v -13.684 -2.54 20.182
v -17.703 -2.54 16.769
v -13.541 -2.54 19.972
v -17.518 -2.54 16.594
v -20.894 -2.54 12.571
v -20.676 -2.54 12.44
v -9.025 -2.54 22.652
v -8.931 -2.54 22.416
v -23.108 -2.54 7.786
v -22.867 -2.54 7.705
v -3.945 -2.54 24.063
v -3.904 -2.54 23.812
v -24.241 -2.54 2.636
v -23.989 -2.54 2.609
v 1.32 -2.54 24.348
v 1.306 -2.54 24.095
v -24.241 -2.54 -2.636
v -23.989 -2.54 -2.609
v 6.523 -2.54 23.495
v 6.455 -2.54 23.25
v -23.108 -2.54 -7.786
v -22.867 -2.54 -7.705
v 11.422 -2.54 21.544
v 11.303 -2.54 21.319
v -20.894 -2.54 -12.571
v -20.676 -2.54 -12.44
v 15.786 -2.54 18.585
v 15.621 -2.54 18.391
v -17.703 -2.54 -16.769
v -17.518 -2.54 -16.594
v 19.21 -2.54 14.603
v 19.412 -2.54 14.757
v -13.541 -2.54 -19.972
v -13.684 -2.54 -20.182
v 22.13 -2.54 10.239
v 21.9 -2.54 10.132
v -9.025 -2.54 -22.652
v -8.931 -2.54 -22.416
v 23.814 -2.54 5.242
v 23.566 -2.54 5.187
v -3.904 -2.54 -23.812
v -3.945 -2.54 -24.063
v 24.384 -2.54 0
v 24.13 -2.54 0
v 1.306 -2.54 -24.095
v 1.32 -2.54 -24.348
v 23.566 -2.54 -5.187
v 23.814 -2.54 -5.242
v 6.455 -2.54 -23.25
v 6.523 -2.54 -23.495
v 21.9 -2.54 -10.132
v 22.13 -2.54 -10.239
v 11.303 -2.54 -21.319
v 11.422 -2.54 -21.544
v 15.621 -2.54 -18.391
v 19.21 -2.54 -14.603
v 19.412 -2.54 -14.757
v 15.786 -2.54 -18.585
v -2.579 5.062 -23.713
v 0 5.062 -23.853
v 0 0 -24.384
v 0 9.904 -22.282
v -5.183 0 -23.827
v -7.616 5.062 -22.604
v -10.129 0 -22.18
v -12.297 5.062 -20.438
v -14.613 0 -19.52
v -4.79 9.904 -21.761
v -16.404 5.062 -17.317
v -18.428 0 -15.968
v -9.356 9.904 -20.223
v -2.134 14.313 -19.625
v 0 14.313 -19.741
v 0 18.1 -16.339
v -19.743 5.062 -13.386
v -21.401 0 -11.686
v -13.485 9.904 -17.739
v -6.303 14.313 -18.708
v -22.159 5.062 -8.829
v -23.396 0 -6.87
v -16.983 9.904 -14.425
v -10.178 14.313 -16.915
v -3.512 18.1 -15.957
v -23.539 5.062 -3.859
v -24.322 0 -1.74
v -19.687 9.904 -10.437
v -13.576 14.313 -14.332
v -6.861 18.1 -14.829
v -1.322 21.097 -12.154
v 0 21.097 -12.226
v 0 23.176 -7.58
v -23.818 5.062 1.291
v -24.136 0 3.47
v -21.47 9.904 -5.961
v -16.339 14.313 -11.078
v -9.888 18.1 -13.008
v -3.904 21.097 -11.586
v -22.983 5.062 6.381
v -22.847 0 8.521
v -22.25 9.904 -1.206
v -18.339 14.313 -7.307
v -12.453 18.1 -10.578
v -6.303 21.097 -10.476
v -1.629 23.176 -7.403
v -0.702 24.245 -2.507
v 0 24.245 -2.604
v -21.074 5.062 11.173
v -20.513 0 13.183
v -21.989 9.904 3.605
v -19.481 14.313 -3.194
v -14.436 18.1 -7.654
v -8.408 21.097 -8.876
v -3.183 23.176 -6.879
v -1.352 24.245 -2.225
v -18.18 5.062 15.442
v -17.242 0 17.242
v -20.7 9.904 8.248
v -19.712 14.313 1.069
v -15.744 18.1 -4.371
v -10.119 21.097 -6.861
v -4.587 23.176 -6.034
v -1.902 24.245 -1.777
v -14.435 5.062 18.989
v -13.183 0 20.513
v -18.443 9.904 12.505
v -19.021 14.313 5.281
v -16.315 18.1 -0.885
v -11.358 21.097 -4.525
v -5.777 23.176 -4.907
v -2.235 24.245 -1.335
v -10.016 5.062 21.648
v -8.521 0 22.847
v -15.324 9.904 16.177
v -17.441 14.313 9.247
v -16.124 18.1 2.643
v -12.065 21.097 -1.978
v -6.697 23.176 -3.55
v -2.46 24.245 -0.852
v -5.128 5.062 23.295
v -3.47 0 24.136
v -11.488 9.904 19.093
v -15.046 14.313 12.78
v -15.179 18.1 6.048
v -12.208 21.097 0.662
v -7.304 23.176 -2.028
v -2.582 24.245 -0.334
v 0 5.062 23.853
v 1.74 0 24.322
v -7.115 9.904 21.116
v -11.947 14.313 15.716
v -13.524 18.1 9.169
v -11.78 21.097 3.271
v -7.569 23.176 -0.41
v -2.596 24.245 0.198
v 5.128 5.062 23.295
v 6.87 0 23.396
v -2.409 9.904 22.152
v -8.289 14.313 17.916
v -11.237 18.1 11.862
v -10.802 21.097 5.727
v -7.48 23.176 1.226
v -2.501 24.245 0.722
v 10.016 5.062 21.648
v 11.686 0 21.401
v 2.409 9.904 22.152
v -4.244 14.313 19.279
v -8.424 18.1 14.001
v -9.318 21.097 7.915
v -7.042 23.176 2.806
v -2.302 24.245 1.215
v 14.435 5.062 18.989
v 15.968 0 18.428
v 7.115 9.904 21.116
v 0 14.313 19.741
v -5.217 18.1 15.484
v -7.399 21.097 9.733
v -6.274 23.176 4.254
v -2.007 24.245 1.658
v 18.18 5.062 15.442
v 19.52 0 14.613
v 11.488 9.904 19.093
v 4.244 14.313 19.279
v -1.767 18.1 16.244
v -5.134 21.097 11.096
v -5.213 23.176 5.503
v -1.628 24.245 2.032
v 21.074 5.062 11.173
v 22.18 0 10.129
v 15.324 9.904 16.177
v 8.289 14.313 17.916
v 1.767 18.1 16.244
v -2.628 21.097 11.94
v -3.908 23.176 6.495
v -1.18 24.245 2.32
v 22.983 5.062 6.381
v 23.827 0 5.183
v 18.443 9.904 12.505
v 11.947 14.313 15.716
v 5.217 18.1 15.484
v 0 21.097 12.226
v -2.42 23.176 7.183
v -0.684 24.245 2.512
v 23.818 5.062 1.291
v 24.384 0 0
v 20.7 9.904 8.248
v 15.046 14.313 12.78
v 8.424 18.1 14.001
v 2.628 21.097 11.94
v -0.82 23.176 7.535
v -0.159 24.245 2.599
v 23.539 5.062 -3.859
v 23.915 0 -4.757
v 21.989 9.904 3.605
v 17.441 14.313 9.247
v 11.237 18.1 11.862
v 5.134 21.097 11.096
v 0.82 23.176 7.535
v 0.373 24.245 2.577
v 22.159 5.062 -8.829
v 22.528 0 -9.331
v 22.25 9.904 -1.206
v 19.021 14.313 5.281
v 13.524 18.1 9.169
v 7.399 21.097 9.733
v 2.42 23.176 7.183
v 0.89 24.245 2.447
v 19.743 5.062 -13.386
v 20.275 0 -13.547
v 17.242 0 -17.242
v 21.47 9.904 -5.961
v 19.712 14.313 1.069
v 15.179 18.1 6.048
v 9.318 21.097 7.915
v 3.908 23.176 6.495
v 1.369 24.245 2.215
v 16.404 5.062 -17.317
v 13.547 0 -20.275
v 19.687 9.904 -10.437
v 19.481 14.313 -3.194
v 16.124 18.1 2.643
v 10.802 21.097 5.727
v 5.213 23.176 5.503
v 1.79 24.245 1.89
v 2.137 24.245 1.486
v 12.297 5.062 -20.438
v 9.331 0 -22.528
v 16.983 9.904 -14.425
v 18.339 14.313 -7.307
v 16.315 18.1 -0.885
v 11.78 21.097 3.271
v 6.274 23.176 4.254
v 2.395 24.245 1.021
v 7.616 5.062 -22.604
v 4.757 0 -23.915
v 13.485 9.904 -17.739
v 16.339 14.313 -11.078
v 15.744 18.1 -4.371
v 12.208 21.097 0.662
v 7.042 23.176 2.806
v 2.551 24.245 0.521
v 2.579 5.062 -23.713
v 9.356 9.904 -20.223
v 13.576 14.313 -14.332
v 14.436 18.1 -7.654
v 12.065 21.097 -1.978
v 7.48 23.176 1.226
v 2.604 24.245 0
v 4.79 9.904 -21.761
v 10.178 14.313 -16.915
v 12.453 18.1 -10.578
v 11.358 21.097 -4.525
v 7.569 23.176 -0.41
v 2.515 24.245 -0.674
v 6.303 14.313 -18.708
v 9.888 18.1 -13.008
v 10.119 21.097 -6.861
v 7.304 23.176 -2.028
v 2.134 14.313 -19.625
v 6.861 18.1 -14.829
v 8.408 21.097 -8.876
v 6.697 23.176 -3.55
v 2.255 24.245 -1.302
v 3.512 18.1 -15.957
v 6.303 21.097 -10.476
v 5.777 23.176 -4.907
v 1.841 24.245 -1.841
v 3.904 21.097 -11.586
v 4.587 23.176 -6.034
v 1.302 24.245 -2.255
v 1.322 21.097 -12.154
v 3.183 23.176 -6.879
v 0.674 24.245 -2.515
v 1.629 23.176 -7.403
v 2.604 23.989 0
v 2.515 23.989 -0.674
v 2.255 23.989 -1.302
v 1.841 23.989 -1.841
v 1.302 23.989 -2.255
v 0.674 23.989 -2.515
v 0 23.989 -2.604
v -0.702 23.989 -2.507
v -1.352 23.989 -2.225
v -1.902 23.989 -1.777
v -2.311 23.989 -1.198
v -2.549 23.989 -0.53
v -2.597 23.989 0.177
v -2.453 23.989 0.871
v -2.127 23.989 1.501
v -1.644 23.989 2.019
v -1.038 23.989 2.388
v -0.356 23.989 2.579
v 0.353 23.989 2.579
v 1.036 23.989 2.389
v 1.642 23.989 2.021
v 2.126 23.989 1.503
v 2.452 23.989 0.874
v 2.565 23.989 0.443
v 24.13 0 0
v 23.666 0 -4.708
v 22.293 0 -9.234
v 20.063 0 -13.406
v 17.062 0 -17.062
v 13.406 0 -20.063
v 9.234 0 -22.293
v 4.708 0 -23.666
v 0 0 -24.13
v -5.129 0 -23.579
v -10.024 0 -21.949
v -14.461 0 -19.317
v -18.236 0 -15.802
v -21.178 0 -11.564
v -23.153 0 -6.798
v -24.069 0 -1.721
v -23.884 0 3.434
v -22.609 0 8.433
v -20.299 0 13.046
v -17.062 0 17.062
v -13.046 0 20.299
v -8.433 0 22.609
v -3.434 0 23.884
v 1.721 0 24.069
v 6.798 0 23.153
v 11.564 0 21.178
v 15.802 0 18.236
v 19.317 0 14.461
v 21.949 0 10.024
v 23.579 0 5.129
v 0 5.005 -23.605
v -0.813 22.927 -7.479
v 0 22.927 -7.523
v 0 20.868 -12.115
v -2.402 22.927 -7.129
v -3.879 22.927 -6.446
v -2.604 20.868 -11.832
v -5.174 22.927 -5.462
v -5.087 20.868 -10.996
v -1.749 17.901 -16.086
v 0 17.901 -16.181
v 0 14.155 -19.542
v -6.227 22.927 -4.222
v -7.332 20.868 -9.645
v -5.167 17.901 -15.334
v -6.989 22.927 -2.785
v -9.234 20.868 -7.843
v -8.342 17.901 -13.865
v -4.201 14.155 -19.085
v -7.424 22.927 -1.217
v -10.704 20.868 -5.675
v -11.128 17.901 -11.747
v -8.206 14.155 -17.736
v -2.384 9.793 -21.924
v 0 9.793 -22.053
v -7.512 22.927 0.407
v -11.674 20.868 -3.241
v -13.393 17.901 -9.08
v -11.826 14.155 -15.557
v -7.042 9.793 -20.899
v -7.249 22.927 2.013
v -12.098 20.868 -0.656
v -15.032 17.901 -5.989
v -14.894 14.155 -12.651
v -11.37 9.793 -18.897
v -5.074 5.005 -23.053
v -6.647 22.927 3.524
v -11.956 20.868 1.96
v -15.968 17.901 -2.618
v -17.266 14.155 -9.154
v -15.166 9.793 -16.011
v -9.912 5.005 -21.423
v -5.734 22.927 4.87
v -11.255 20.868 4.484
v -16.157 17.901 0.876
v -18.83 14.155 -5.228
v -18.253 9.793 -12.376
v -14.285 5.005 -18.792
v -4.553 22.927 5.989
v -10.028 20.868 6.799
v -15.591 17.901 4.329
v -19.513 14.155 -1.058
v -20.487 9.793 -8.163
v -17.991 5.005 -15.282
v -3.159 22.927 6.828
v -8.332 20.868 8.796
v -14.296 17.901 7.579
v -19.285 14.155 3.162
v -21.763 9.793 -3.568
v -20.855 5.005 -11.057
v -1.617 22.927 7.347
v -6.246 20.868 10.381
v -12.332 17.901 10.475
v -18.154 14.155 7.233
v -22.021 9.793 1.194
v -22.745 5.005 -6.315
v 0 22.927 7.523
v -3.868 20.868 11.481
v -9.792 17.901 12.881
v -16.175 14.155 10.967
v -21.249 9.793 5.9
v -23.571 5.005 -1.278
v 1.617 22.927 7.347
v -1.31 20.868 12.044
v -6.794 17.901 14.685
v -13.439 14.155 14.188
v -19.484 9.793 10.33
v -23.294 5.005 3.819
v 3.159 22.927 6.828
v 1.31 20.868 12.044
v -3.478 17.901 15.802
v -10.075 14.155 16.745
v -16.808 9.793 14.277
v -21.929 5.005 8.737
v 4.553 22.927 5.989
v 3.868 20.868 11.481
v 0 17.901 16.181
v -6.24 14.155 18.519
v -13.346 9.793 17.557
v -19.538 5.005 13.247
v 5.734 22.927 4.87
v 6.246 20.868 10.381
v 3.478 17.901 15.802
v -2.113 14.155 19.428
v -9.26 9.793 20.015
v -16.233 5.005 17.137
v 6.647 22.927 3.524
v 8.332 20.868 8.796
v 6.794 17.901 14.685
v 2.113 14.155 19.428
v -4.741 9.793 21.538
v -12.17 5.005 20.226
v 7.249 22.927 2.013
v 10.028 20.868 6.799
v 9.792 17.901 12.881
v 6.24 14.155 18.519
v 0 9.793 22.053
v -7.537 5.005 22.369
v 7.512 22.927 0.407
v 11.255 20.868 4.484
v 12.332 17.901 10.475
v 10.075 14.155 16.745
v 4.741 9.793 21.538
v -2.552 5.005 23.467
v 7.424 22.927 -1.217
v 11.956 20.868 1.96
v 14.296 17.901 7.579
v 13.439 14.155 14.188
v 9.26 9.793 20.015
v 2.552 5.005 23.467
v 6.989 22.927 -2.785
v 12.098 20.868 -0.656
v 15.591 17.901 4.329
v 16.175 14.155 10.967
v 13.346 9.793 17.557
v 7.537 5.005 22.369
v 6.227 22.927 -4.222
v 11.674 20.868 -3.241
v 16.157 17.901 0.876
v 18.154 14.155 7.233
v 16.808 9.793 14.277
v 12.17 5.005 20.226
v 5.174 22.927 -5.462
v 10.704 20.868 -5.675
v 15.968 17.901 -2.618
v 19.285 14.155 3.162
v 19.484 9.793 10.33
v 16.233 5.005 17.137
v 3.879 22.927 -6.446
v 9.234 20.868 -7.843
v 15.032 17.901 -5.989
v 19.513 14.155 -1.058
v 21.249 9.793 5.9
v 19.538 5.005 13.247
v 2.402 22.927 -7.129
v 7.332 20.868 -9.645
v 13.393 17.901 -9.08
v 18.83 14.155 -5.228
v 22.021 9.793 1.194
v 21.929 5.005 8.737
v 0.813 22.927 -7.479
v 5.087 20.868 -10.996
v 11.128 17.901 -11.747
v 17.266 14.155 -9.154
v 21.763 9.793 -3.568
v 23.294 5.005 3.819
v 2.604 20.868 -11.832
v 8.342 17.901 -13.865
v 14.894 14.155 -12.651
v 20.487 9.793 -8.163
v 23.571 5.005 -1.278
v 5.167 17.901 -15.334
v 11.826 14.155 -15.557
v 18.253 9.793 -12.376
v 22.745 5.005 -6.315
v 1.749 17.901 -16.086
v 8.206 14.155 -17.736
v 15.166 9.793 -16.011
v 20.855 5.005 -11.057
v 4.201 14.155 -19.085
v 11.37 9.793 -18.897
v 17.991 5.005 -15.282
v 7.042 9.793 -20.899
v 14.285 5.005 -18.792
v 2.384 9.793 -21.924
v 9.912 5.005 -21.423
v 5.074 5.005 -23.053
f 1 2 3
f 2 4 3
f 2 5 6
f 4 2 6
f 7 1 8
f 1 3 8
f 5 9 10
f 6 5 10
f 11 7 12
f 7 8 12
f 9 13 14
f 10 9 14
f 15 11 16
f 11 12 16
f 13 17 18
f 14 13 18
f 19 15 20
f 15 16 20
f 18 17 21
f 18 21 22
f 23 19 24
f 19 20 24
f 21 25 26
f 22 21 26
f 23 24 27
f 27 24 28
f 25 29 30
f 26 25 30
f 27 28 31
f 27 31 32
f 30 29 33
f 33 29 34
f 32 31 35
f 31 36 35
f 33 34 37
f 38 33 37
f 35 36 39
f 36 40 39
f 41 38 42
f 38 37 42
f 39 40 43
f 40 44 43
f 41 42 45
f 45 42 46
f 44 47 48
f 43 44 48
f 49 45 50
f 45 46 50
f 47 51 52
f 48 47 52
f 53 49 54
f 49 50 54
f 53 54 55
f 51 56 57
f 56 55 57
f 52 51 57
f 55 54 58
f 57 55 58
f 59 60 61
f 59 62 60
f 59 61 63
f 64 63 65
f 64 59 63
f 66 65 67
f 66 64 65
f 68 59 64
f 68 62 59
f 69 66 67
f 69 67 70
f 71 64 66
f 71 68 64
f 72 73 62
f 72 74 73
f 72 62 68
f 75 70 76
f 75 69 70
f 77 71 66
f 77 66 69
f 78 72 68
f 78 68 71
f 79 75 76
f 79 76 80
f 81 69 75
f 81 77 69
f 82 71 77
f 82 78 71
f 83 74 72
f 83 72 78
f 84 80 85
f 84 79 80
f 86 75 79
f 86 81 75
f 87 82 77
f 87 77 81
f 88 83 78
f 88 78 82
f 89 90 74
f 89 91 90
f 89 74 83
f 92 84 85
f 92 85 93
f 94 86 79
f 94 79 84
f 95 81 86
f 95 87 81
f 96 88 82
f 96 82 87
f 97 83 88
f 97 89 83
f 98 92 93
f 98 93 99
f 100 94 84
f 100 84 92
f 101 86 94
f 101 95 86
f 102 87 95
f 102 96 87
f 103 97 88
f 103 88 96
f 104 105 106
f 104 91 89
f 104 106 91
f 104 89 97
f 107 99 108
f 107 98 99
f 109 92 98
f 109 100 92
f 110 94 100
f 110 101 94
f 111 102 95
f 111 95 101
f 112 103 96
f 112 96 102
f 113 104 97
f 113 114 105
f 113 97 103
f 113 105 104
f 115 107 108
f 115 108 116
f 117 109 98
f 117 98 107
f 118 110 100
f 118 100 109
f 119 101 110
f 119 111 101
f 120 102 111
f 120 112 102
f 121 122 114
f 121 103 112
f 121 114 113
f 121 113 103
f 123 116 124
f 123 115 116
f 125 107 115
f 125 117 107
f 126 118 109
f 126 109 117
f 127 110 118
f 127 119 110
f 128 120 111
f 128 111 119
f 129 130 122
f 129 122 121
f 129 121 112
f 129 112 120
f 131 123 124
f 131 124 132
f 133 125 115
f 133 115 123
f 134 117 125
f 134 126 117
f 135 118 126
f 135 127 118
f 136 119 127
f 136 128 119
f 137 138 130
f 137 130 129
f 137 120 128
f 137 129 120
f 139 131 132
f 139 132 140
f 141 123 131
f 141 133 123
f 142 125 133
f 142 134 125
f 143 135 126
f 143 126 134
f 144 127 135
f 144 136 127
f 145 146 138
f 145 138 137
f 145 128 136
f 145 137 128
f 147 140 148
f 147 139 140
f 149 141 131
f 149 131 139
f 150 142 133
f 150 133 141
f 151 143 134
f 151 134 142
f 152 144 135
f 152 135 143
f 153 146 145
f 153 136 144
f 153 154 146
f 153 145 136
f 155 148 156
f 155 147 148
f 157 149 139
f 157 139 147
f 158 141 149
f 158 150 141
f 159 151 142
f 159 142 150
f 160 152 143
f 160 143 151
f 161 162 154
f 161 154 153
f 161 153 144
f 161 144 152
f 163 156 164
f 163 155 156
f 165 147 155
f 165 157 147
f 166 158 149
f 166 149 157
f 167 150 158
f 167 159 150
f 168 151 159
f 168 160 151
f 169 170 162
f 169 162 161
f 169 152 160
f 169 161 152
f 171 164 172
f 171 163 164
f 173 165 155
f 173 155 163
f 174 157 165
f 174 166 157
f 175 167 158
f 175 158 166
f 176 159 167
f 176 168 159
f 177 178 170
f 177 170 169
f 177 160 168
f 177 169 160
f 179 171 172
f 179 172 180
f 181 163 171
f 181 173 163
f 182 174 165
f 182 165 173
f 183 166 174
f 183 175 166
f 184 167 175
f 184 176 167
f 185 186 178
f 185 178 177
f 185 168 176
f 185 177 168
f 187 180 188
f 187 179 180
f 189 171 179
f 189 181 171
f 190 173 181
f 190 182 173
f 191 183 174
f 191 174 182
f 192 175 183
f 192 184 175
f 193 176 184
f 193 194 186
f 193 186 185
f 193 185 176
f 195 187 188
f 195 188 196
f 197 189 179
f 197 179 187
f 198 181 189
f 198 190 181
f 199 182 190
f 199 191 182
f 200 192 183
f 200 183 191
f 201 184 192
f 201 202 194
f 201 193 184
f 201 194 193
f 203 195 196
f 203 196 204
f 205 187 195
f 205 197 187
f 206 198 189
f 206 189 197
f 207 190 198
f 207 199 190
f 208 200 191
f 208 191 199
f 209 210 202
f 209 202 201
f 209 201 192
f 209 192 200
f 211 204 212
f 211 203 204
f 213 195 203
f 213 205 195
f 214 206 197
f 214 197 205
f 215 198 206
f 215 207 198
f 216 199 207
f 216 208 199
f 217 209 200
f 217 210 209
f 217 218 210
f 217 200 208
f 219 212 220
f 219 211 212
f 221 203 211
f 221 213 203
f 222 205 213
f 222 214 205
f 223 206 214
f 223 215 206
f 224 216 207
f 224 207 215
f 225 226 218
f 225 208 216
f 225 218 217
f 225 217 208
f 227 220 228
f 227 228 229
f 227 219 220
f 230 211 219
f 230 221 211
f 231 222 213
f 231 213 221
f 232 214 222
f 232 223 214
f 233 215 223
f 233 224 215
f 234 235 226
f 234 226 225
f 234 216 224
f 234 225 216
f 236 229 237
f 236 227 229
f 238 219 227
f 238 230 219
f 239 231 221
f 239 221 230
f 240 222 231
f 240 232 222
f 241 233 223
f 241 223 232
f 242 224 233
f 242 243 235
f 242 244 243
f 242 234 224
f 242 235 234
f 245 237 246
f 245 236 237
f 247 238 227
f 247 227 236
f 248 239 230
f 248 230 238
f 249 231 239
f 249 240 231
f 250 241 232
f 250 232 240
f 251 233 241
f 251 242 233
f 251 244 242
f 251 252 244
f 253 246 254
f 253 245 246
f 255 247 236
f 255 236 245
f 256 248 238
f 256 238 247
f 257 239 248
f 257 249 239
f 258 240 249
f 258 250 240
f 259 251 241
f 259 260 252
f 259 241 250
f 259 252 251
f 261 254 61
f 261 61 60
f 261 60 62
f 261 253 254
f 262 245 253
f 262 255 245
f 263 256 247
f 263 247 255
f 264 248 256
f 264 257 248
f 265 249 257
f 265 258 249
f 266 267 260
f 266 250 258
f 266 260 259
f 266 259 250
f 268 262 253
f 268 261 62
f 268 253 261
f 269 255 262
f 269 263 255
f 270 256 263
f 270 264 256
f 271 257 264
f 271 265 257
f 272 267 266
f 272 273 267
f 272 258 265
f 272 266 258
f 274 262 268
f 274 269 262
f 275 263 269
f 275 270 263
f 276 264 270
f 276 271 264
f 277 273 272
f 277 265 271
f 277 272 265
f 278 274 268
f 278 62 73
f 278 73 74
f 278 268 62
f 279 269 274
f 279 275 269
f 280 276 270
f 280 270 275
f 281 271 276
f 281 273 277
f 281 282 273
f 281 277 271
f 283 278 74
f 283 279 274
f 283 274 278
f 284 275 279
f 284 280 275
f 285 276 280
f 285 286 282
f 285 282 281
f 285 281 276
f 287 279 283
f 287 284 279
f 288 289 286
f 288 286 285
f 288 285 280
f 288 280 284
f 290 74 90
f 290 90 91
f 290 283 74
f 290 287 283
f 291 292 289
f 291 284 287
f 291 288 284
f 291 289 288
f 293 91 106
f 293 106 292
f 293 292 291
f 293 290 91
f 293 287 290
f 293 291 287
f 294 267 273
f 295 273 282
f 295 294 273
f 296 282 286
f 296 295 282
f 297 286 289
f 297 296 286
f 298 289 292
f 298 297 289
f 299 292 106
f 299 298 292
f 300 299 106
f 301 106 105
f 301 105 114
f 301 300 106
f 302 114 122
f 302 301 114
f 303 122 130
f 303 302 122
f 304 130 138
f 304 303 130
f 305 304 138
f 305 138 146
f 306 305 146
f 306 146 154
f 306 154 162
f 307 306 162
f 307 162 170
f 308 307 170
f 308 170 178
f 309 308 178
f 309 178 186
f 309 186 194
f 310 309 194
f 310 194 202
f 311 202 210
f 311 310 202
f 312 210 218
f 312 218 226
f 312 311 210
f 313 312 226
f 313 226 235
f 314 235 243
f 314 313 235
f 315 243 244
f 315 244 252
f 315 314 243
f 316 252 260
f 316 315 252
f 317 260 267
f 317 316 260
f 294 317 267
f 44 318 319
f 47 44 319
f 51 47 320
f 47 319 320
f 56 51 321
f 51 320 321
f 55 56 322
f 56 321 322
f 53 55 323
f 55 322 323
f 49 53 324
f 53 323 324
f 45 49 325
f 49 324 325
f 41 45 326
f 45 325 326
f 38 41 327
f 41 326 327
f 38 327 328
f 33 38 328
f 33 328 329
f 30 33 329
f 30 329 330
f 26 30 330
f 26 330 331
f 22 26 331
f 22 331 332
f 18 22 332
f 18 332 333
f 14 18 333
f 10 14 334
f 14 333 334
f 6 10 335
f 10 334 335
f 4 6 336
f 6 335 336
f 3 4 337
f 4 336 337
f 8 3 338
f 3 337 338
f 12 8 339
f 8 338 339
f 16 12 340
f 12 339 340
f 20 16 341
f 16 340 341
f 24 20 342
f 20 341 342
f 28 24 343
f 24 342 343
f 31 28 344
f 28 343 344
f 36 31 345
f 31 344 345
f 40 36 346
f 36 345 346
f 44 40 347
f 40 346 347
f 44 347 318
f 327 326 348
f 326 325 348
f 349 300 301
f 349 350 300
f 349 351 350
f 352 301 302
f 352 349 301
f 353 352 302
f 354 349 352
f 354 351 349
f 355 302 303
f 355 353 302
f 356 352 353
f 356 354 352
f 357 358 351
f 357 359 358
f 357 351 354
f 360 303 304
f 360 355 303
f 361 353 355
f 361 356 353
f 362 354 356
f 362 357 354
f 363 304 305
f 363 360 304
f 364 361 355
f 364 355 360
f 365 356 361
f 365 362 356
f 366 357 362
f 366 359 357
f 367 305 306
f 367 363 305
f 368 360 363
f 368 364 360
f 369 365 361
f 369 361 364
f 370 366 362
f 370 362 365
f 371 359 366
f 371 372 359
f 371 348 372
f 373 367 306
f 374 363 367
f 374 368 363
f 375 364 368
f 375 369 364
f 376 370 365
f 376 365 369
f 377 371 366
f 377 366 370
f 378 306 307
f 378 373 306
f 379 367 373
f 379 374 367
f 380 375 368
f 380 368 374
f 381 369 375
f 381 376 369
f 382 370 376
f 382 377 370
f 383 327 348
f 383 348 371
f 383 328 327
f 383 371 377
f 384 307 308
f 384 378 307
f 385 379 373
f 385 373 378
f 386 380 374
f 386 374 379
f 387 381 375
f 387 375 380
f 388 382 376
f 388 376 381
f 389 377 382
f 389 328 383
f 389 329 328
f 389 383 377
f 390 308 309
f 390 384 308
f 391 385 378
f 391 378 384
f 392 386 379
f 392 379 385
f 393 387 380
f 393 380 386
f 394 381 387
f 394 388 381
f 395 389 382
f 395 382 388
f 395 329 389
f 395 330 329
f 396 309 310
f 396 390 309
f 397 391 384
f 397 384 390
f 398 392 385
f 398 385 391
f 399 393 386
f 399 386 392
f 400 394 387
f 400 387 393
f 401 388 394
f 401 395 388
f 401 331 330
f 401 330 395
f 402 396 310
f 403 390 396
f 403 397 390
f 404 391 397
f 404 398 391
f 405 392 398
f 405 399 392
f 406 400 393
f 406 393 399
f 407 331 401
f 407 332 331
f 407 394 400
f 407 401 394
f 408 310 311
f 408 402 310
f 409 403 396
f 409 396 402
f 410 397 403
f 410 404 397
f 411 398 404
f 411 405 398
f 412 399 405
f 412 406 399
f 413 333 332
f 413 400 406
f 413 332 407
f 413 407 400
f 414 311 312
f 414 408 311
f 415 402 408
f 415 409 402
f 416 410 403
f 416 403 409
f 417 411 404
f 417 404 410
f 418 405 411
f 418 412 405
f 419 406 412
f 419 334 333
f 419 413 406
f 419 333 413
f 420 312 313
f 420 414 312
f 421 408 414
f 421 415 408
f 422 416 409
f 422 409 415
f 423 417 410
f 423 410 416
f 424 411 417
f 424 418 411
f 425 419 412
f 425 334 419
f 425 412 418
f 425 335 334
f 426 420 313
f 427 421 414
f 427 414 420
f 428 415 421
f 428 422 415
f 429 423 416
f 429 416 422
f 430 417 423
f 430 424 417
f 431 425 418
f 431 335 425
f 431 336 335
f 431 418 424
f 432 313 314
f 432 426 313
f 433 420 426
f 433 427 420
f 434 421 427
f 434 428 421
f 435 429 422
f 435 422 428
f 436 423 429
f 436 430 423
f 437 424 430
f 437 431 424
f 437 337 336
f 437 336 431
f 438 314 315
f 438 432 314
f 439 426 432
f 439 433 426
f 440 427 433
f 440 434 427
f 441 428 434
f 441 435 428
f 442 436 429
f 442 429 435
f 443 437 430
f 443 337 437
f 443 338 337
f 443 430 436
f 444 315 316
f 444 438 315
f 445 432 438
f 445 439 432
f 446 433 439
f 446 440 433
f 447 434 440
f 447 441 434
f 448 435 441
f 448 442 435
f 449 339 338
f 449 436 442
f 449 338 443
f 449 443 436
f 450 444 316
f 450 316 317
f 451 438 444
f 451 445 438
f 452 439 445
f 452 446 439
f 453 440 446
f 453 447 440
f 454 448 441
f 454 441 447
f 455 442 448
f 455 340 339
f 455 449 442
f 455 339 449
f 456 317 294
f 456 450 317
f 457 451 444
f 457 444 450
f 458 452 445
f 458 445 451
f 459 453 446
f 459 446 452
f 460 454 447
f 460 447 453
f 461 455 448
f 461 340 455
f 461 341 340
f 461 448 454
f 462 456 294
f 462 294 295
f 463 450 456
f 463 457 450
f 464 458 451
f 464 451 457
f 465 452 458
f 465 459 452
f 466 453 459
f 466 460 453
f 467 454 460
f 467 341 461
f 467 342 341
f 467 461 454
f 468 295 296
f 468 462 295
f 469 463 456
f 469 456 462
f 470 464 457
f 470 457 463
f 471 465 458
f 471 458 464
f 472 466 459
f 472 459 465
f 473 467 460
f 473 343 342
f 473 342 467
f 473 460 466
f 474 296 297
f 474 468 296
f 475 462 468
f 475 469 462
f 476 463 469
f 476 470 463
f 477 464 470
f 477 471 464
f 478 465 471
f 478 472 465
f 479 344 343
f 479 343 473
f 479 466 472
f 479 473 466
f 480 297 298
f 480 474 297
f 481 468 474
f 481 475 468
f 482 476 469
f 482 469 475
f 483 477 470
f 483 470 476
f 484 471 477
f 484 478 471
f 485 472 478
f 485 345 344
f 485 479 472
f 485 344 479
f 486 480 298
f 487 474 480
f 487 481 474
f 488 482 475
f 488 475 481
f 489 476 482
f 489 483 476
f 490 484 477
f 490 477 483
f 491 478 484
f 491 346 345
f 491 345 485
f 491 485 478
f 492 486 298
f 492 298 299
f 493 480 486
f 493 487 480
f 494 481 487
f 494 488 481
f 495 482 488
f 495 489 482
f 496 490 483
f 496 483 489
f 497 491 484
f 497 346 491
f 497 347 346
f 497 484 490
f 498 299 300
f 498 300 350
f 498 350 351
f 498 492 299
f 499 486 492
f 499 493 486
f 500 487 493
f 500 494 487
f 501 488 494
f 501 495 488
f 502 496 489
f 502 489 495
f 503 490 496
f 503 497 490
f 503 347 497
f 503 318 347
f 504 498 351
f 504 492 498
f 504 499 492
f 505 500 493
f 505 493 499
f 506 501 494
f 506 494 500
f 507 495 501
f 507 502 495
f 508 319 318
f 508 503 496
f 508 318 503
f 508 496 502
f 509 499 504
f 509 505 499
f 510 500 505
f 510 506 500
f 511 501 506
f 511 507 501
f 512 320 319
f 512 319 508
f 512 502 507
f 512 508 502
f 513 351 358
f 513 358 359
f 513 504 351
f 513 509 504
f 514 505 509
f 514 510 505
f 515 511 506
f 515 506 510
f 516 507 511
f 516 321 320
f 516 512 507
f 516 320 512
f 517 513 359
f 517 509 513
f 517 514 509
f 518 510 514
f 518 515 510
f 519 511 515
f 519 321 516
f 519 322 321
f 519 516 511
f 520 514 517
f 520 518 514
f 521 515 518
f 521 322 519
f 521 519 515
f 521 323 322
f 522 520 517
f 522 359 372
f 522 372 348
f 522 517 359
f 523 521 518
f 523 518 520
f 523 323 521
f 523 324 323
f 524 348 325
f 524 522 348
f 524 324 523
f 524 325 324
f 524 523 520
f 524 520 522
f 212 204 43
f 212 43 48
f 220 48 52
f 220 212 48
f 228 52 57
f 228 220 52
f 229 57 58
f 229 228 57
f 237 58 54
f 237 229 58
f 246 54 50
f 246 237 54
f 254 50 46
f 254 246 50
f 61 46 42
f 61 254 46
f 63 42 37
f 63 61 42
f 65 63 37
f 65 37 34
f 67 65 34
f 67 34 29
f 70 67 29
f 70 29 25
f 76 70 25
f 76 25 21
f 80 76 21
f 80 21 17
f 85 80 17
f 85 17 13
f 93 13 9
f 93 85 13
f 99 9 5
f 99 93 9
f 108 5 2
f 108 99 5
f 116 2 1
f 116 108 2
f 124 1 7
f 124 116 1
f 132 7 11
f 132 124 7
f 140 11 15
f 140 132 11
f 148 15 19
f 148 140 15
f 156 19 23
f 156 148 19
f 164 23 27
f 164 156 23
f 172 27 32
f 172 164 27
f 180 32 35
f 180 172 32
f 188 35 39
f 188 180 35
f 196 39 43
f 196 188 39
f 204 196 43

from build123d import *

# Parameters (mm, degrees)
SKETCH3_R           = 2.6035
CUT_EXTRUDE1_DEPTH  = 25.384
SKETCH4_R           = 24.384
SKETCH4_R_2         = 24.13
BOSS_EXTRUDE1_DEPTH = 2.54


with BuildPart() as part:
    # Sketch2 → Revolve1 (revolve)
    with BuildSketch(Plane(origin=(0, 0, 0), x_dir=(0, 0, -1), z_dir=(1, 0, 0))):
        with BuildLine():
            Line((24.13, 0), (24.384, 0))
            ThreePointArc((24.384, 0), (17.242091752, 17.242091752), (0, 24.384))
            Line((0, 24.384), (0, 24.13))
            ThreePointArc((0, 24.13), (17.06248663, 17.06248663), (24.13, 0))
        make_face()
    revolve(axis=Axis((0, 0, 0), (0, 1, 0)))

    # Sketch3 → Cut-Extrude1 (cut, through all)
    with BuildSketch(Plane(origin=(0, 0, 0), x_dir=(1, 0, 0), z_dir=(0, 1, 0))):
        Circle(SKETCH3_R)
    extrude(amount=CUT_EXTRUDE1_DEPTH, mode=Mode.SUBTRACT)

    # Sketch4 → Boss-Extrude1 (add)
    with BuildSketch(Plane(origin=(0, 0, 0), x_dir=(1, 0, 0), z_dir=(0, 1, 0))):
        Circle(SKETCH4_R)
        Circle(SKETCH4_R_2, mode=Mode.SUBTRACT)
    extrude(amount=-BOSS_EXTRUDE1_DEPTH)


solid = part.part
